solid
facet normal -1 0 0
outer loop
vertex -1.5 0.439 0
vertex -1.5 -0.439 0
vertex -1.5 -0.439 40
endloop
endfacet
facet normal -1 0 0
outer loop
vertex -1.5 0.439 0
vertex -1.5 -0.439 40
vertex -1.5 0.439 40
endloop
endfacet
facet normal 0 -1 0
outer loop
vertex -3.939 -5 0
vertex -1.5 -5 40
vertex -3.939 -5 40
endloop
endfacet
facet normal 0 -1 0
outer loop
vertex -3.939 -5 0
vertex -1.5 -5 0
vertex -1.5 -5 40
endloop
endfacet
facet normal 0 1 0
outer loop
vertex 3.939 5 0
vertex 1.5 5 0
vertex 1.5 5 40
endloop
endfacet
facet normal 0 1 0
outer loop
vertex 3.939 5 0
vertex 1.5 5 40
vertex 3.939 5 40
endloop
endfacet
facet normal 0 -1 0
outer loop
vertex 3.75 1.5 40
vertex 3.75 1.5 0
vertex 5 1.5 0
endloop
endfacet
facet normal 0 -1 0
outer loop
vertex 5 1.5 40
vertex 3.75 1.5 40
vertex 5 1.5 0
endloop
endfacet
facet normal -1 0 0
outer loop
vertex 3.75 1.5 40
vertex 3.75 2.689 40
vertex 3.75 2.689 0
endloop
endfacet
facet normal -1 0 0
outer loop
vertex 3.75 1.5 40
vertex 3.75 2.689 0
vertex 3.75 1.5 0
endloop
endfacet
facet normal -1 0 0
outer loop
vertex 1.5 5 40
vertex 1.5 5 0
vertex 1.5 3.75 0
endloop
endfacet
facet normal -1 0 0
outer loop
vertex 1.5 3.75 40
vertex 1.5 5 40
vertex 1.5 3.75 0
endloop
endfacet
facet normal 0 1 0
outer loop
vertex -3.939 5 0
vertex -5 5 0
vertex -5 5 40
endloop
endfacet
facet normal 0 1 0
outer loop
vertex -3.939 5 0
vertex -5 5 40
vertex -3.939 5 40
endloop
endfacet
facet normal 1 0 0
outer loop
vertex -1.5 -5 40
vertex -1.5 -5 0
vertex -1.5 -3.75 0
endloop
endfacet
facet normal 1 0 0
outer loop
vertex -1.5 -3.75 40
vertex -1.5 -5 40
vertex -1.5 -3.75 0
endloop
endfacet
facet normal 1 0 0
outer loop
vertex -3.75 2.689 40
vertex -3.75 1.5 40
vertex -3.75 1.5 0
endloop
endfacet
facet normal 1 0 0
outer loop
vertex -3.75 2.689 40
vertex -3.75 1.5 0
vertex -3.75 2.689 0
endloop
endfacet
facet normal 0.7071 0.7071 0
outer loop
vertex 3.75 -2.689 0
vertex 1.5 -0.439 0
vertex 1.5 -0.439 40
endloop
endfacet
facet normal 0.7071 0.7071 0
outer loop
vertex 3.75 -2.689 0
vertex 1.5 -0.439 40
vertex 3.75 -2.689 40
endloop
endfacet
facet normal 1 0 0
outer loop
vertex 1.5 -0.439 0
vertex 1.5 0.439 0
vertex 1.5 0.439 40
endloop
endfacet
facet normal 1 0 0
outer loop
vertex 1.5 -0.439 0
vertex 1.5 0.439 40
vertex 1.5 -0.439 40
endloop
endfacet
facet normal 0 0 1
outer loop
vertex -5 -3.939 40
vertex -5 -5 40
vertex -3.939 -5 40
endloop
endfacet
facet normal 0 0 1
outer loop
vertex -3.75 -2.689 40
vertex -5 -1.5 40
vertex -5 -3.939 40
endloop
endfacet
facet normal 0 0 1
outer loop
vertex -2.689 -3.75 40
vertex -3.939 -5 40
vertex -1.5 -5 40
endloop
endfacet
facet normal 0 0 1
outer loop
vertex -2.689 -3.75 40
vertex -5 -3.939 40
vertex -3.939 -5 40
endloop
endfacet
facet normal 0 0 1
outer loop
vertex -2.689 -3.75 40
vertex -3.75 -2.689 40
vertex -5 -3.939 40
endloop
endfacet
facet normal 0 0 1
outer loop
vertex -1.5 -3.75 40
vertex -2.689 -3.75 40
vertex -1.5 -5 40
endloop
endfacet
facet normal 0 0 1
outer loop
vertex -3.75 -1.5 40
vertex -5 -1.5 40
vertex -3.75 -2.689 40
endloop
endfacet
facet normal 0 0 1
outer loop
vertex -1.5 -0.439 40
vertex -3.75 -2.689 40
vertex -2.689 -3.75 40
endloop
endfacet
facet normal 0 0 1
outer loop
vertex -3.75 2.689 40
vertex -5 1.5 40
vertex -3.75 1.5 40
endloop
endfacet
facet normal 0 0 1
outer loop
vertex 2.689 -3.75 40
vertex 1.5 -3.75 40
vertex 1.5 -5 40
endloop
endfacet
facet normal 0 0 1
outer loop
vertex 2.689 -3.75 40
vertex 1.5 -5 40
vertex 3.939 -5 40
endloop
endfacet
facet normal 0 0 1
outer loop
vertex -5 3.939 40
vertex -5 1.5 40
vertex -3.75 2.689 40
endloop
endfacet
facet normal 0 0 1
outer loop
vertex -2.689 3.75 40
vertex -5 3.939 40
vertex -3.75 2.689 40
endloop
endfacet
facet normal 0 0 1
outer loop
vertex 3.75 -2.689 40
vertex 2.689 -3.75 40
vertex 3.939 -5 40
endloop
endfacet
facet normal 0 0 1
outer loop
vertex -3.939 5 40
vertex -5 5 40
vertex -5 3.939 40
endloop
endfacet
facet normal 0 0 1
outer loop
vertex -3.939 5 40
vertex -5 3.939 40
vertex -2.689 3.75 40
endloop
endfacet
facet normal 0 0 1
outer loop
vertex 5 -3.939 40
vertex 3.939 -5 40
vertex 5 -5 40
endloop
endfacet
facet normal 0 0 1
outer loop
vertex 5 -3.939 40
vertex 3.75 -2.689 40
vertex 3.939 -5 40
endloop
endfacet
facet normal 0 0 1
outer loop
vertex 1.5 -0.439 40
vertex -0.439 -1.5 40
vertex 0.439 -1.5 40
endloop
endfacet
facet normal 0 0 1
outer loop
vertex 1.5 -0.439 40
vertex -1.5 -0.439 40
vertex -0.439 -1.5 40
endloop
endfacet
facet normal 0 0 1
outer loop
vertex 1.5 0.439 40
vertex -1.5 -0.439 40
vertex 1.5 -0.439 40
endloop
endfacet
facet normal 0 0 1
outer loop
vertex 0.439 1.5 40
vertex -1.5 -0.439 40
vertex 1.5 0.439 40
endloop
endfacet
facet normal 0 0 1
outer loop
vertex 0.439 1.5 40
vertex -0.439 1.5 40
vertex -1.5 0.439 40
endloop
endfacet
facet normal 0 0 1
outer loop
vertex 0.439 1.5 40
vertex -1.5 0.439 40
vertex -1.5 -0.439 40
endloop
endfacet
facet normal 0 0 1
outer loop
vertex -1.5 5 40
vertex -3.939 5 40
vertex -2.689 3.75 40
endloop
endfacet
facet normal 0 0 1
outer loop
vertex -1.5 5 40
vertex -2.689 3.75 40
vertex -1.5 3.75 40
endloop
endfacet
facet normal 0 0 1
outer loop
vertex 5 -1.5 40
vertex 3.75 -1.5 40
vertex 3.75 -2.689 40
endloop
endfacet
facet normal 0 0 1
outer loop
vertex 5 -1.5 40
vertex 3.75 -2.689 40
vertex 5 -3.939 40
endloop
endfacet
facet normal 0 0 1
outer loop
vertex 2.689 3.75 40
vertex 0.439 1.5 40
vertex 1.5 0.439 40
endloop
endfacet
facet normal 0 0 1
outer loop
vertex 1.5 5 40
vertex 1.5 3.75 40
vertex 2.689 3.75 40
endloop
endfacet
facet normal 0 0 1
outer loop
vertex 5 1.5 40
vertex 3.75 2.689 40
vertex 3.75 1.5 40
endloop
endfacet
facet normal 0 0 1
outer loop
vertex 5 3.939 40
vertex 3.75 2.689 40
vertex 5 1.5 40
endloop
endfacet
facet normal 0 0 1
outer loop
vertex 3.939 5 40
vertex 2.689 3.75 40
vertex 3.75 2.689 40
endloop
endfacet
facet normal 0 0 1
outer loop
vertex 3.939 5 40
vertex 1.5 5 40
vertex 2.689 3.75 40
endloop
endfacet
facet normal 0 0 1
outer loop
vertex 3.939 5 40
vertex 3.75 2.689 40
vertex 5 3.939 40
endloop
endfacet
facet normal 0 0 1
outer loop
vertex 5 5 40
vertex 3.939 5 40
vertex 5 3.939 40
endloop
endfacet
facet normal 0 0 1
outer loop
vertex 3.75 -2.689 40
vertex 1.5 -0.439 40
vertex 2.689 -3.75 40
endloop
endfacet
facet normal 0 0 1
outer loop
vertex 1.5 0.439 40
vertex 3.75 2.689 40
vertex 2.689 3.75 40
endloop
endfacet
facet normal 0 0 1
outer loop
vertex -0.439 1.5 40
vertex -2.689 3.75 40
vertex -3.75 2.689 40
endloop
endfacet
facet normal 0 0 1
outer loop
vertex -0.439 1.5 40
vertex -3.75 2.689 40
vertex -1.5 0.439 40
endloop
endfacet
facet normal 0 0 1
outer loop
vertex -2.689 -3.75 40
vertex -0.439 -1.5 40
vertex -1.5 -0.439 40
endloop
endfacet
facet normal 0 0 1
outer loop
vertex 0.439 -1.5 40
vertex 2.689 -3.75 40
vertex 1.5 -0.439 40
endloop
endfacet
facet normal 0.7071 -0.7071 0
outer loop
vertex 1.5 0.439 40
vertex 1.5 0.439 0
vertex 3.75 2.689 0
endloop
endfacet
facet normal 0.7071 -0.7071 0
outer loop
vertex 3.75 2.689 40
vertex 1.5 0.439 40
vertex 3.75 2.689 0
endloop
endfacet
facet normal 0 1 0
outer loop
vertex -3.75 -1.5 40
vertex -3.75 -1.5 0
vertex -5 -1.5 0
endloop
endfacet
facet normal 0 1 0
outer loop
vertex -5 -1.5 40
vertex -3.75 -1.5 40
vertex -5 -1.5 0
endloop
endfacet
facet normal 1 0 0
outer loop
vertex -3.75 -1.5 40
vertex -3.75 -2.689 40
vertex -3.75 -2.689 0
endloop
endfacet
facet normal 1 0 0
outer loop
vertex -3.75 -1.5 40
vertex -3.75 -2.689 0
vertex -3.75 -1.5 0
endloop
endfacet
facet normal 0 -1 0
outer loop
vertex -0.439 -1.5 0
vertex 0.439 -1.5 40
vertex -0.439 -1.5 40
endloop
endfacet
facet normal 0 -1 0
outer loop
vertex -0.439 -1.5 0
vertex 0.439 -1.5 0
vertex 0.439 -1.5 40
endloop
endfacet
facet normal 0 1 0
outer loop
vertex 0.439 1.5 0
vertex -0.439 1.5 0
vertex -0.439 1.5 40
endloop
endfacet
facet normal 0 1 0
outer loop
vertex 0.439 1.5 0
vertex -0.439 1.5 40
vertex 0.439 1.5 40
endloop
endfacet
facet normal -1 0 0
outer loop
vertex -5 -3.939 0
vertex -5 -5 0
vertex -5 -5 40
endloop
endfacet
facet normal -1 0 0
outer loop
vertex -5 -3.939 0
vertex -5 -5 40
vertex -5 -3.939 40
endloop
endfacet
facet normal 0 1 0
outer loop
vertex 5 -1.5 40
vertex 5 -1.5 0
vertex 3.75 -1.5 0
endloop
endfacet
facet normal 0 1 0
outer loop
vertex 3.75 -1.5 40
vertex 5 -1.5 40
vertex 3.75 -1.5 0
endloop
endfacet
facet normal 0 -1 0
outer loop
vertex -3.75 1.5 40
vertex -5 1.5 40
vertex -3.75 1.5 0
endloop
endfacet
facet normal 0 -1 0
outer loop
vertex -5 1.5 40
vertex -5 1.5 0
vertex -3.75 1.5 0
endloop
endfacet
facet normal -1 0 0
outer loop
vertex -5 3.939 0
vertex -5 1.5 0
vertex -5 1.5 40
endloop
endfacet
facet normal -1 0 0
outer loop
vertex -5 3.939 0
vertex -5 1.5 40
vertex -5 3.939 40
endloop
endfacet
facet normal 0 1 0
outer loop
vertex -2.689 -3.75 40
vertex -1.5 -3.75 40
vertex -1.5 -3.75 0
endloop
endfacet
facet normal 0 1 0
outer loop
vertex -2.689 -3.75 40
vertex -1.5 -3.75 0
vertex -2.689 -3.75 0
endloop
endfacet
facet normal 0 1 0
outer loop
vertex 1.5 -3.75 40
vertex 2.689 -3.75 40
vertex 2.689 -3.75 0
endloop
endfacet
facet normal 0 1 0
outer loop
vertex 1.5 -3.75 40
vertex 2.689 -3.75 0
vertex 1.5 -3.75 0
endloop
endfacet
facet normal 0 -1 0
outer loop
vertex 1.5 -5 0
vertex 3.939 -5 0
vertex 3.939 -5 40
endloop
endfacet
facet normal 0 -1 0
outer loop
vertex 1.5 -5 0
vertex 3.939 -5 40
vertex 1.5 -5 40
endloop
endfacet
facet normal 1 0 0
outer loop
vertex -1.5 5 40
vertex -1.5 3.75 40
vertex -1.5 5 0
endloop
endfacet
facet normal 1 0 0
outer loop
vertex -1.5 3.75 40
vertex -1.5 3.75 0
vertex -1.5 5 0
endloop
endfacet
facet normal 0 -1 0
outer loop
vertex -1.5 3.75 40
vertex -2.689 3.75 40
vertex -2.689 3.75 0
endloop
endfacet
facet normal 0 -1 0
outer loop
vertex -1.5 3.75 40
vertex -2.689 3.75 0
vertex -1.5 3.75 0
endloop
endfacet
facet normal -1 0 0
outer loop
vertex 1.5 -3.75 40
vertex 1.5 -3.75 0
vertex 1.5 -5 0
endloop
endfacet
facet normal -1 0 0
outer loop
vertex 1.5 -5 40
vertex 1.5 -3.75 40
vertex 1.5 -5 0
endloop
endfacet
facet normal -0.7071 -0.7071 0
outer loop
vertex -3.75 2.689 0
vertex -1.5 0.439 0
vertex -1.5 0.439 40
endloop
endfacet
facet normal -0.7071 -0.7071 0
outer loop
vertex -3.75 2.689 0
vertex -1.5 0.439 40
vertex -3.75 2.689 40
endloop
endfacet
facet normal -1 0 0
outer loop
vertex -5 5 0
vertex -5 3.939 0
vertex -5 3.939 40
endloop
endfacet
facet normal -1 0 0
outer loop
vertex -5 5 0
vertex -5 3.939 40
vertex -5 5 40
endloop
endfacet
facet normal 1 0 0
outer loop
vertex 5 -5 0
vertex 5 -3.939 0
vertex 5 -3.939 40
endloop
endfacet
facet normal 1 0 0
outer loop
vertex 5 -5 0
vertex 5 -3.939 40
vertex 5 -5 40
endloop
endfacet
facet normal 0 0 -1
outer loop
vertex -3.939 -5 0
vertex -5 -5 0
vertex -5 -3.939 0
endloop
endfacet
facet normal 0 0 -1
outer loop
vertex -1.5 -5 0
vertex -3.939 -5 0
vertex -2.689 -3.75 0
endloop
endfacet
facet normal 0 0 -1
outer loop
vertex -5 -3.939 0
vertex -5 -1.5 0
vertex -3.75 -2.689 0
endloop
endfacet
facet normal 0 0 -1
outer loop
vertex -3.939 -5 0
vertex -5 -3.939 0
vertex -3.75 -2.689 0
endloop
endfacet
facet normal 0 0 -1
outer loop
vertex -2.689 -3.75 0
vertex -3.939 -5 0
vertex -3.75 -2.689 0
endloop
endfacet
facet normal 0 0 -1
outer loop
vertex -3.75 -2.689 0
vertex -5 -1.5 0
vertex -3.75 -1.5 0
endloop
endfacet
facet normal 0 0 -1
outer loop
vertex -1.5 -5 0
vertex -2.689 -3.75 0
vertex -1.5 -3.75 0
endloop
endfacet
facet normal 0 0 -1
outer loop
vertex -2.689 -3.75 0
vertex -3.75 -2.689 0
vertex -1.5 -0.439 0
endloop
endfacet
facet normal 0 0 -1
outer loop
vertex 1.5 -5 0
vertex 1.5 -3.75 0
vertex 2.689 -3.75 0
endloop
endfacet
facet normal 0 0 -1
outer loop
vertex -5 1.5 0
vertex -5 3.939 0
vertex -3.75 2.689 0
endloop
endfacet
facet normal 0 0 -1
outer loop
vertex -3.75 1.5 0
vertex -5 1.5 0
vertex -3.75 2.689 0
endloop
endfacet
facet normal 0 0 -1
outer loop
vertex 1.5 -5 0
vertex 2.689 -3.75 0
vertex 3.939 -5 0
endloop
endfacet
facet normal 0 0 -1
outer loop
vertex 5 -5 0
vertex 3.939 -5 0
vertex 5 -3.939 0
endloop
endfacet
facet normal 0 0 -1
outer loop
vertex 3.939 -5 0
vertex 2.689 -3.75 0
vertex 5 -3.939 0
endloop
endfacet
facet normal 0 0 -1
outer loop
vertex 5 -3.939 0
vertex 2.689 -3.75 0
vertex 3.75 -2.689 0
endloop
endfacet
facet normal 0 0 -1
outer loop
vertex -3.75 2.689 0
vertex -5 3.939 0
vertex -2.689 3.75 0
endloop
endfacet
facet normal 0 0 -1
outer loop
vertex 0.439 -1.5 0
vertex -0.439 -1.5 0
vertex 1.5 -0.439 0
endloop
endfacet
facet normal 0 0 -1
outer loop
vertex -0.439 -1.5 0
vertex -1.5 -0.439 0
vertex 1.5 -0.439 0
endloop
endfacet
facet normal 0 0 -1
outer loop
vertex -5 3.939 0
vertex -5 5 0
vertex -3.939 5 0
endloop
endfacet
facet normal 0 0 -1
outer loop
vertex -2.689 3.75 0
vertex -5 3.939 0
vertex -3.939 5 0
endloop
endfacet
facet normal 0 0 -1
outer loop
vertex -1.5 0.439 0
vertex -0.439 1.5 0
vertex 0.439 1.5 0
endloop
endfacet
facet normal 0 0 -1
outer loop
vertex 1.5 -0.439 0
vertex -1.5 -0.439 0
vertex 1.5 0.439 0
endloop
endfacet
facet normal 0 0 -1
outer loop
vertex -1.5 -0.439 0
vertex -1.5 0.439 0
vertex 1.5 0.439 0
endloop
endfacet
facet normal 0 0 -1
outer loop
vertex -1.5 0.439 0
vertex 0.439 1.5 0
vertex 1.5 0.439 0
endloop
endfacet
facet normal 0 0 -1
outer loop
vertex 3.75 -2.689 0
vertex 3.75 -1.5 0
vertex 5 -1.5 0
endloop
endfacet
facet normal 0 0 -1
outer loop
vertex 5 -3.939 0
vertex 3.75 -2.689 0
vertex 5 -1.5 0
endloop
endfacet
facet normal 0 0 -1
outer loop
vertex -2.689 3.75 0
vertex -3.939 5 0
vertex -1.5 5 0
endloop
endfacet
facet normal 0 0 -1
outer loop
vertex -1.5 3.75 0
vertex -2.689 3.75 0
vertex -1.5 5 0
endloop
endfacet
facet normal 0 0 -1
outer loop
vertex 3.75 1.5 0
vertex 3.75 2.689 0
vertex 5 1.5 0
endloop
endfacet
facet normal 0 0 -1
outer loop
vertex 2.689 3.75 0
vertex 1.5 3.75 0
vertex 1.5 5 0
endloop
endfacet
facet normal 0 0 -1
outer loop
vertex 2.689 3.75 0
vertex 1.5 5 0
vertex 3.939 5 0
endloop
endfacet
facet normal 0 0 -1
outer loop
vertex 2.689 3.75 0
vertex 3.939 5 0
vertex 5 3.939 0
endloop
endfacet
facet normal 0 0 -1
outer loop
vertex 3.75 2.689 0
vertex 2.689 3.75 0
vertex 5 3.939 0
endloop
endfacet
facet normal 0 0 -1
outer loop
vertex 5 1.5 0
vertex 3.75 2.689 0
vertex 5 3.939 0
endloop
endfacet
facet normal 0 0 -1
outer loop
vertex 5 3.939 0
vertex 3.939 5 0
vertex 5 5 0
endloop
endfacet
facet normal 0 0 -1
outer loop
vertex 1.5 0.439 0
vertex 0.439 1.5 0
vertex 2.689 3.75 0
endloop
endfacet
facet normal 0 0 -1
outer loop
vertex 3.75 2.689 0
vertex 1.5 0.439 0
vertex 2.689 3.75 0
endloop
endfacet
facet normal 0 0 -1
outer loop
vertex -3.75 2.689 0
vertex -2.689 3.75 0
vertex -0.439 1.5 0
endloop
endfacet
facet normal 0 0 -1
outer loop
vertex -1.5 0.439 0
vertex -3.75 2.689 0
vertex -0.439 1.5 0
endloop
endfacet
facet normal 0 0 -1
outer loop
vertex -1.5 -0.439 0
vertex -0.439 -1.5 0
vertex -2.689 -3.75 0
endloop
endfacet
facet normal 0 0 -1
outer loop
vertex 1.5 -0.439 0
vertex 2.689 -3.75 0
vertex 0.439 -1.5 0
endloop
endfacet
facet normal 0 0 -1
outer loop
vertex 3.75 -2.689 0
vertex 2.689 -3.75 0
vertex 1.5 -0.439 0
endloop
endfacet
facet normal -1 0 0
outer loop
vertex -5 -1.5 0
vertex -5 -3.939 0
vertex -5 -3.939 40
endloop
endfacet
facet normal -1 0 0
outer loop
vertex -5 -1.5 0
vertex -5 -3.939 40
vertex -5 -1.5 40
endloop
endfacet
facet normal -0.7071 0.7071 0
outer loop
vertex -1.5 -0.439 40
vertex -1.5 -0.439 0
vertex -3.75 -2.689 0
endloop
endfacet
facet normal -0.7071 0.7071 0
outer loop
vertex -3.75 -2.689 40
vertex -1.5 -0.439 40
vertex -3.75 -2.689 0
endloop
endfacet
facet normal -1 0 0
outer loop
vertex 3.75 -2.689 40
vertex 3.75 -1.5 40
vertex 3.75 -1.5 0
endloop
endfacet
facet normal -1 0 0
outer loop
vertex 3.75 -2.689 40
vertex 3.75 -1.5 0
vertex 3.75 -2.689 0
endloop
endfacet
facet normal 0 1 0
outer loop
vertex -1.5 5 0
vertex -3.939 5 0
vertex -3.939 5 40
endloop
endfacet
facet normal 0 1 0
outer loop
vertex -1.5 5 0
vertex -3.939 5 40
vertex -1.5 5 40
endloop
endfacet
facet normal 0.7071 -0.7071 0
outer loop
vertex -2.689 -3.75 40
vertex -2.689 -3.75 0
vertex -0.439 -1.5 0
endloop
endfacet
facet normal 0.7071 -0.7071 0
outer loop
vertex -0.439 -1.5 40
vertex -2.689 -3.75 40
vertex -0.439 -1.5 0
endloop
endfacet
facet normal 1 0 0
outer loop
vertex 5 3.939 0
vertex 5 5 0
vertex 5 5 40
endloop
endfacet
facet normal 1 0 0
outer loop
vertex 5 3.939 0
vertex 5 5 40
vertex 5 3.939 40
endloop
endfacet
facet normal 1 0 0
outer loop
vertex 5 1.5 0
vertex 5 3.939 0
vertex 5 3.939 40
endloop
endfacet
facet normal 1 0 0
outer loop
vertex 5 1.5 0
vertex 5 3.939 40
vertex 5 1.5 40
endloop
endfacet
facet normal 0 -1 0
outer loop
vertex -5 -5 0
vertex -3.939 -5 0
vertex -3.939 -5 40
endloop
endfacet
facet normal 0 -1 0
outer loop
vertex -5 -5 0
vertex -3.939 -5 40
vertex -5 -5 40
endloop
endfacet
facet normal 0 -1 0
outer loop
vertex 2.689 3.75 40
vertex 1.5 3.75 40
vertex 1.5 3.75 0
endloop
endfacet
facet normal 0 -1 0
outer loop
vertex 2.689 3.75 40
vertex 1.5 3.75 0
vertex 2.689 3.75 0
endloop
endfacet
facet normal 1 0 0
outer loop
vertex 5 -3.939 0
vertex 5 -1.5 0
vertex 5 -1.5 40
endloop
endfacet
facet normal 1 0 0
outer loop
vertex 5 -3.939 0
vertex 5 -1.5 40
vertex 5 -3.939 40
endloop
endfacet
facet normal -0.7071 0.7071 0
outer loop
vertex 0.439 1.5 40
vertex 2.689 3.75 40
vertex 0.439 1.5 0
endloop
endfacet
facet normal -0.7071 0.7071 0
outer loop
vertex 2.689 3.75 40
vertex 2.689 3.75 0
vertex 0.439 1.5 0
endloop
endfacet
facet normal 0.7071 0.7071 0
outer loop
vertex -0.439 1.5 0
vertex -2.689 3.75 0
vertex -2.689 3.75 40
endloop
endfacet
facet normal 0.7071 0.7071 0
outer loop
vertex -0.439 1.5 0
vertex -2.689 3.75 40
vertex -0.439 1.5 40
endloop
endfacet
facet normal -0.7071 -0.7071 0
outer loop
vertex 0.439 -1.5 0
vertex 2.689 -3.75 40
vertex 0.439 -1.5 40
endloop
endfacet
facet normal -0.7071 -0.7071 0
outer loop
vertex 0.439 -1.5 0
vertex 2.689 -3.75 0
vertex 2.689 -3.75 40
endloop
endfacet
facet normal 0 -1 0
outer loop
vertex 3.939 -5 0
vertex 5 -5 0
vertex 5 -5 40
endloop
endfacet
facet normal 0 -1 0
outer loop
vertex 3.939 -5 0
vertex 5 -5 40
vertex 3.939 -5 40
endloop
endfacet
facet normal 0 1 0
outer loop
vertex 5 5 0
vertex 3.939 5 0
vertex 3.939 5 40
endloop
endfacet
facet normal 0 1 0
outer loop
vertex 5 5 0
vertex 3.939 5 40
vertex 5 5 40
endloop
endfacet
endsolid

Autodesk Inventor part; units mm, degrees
ref_plane "YZ Plane" through (0, 0, 0) normal (1, 0, 0) x (0, 1, 0)
ref_plane "XZ Plane" through (0, 0, 0) normal (0, 1, 0) x (-1, 0, 0)
ref_plane "XY Plane" through (0, 0, 0) normal (0, 0, 1) x (1, 0, 0)
sketch "Sketch1" plane through (0, 0, 0) normal (0, 0, 1) x (1, 0, 0)
  line L0 (-4.4697, -5.5303) -> (4.4697, 5.5303) construction
  line L1 (5.5303, 4.4697) -> (-5, -4.0411) construction
  line L2 (4.4697, -5.5303) -> (-4.4697, 5.5303) construction
  line L3 (-5.5303, 4.4697) -> (5.5303, -4.4697) construction
  line L4 (-5, -5) -> (-5, -3.9393)
  line L5 (-5, 3.9393) -> (-5, 5)
  line L6 (5, 5) -> (5, 3.9393)
  line L7 (5, -3.9393) -> (5, -5)
  line L8 (-5, 5) -> (-3.9393, 5)
  line L9 (3.9393, 5) -> (5, 5)
  line L10 (5, -5) -> (3.9393, -5)
  line L11 (-3.9393, -5) -> (-5, -5)
  line L12 (-2.6893, 3.75) -> (-0.4393, 1.5)
  line L13 (2.6893, 3.75) -> (0.4393, 1.5)
  line L14 (-1.5, -0.4393) -> (-3.75, -2.6893)
  line L15 (-1.5, 0.4393) -> (-3.75, 2.6893)
  line L16 (2.6893, -3.75) -> (0.4393, -1.5)
  line L17 (-2.6893, -3.75) -> (-0.4393, -1.5)
  line L18 (1.5, 0.4393) -> (3.75, 2.6893)
  line L19 (1.5, -0.4393) -> (3.75, -2.6893)
  line L20 (5, -5) -> (-5, 5) construction
  line L21 (-5, -5) -> (5, 5) construction
  line L22 (3.75, -3.75) -> (-3.75, 3.75) construction
  line L23 (-3.75, -3.75) -> (3.75, 3.75) construction
  line L24 (1.5, -5) -> (-1.5, 5) construction
  line L25 (-1.5, -5) -> (1.5, 5) construction
  line L26 (5, -1.5) -> (-5, 1.5) construction
  line L27 (-5, -1.5) -> (5, 1.5) construction
  line L28 (-5, 1.5) -> (-3.75, 1.5)
  line L29 (-3.75, -1.5) -> (-5, -1.5)
  line L30 (-3.75, -2.6893) -> (-3.75, -1.5)
  line L31 (-3.75, 1.5) -> (-3.75, 2.6893)
  line L32 (-5, -5) -> (-5, -1.5)
  line L33 (-5, 1.5) -> (-5, 5)
  line L34 (-5, 5) -> (-1.5, 5)
  line L35 (1.5, 5) -> (5, 5)
  line L36 (-1.5, 3.75) -> (-1.5, 5)
  line L37 (-2.6893, 3.75) -> (-1.5, 3.75)
  line L38 (1.5, 3.75) -> (2.6893, 3.75)
  line L39 (1.5, 5) -> (1.5, 3.75)
  line L40 (3.75, 1.5) -> (5, 1.5)
  line L41 (3.75, 2.6893) -> (3.75, 1.5)
  line L42 (3.75, -1.5) -> (3.75, -2.6893)
  line L43 (5, 5) -> (5, 1.5)
  line L44 (5, -1.5) -> (5, -5)
  line L45 (5, -1.5) -> (3.75, -1.5)
  line L46 (-0.45, 1.5) -> (0.45, 1.5)
  line L47 (-1.5, -5) -> (-1.5, -3.75)
  line L48 (-1.5, -0.45) -> (-1.5, 0.45)
  line L49 (1.5, 0.45) -> (1.5, -0.45)
  line L50 (2.6893, -3.75) -> (1.5, -3.75)
  line L51 (5, -5) -> (1.5, -5)
  line L52 (-1.5, -5) -> (-5, -5)
  line L53 (1.5, -3.75) -> (1.5, -5)
  line L54 (0.45, -1.5) -> (-0.45, -1.5)
  line L55 (-1.5, -3.75) -> (-2.6893, -3.75)
  point P0 (0, 0)
  point P1 (0, 0)
  dimension "d0" = 10
  dimension "d7" = 1.5
  dimension "d8" = 1.5
  dimension "d9" = 7.5
  dimension "d10" = 7.5
  dimension "d11" = 10
  dimension "d12" = 3
  dimension "d13" = 3
extrude "Extrusion1" add sketch "Sketch1" along normal blind 40
equation "\"d8\" = d7"
equation "\"d10\" = d9"
equation "\"d11\" = d0"
equation "\"d4\" = 0.5 * d0"
equation "\"d5\" = 0.5 * d0"
equation "\"d6\" = 0.5 * d0"
properties part number "maker-beam-40x10x10mm"
